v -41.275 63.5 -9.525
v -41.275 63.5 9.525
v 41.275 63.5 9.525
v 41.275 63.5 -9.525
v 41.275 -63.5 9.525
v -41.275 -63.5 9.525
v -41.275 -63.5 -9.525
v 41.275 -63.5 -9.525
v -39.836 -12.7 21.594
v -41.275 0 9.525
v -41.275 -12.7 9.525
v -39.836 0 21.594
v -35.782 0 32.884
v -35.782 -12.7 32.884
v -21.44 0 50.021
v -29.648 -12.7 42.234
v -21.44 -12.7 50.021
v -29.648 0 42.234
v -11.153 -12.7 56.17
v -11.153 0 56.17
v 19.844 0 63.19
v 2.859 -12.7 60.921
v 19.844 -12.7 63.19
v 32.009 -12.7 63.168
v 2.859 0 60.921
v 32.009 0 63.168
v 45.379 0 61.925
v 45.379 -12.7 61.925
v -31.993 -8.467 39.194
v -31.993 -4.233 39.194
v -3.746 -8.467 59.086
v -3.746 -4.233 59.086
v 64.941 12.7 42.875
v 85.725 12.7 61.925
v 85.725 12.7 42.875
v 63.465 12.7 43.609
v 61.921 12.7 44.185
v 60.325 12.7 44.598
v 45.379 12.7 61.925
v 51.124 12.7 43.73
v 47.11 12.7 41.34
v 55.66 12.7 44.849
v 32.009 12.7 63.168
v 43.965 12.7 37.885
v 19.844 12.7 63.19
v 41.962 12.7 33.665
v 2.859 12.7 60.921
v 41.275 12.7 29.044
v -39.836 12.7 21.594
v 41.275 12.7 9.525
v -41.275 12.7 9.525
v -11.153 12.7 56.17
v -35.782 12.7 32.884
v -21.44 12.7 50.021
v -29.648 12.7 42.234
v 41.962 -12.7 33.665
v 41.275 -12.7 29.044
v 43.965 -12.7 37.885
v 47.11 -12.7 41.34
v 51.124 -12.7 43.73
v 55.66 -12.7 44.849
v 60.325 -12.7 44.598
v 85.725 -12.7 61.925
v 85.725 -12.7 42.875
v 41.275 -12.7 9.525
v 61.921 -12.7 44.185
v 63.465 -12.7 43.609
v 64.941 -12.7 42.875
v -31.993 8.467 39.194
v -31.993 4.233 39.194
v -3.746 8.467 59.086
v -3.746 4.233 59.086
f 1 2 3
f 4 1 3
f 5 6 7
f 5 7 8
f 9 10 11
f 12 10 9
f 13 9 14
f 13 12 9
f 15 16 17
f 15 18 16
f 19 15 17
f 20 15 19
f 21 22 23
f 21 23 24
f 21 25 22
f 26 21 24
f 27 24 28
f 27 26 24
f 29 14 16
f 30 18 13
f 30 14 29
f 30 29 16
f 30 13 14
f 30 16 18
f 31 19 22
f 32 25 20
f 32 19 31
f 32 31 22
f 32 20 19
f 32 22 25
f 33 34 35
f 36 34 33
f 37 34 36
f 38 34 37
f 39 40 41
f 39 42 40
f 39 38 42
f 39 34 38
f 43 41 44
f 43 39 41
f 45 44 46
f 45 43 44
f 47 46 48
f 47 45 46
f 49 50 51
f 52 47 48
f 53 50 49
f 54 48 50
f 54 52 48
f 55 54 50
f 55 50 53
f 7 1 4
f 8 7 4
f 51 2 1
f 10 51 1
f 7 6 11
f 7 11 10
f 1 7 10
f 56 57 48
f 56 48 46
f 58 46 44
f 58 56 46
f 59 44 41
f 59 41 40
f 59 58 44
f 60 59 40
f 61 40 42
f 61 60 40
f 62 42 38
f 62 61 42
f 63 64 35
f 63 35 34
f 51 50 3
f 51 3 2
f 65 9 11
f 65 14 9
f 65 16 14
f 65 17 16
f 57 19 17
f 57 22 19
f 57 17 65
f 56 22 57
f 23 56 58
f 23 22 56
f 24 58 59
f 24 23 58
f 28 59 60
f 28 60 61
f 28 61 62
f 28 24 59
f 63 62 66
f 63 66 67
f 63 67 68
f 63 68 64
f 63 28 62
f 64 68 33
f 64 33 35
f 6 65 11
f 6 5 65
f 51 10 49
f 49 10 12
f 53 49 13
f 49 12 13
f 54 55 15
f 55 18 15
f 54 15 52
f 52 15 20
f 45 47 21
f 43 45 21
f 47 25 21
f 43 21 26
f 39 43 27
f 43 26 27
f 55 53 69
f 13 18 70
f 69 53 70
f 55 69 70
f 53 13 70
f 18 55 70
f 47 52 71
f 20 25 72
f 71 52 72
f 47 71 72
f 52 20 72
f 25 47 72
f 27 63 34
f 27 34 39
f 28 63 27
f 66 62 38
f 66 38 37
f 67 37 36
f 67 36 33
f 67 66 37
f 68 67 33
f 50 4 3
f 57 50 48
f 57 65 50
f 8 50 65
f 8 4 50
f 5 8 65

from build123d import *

# Parameters (mm, degrees)
F1_DEPTH = 63.5
F2_DEPTH = 12.7
F3_DEPTH = 12.7


with BuildPart() as f1:
    # F0 (on Front) → F1 (new body, symmetric)
    with BuildSketch(Plane.XZ):
        Polygon((-41.275, 9.525), (-41.275, -9.525), (41.275, -9.525), (41.275, 9.525), (22.225, 9.525), align=None)
    extrude(amount=F1_DEPTH, both=True)

    # F0 (on Front) → F2 (join, symmetric)
    with BuildSketch(Plane.XZ):
        with BuildLine():
            Line((22.225, 9.525), (41.275, 9.525))
            Line((41.275, 9.525), (41.275, 29.043647))
            ThreePointArc((41.275, 29.043647), (47.109768, 41.340369), (60.325, 44.597907))
            Line((60.325, 44.597907), (60.325, 61.9252))
            Line((60.325, 61.9252), (45.378887, 61.9252))
            ThreePointArc((45.378887, 61.9252), (28.59425, 49.151475), (22.225, 29.043647))
            Line((22.225, 29.043647), (22.225, 9.525))
        make_face()
        with BuildLine():
            Line((85.725, 61.9252), (60.325, 61.9252))
            Line((60.325, 61.9252), (60.325, 44.597907))
            ThreePointArc((60.325, 44.597907), (62.700375, 43.916743), (64.941262, 42.8752))
            Line((64.941262, 42.8752), (85.725, 42.8752))
            Line((85.725, 42.8752), (85.725, 61.9252))
        make_face()
    extrude(amount=F2_DEPTH, both=True)

    # F0 (on Front) → F3 (join, symmetric)
    with BuildSketch(Plane.XZ):
        with BuildLine():
            add(Edge.make_bspline(
                [(-41.275, 9.525), (-40.837802, 41.657459), (-14.82299, 70.037253), (45.378887, 61.9252)],
                knots=[0, 0, 0, 0, 101.265379, 101.265379, 101.265379, 101.265379], degree=3))
            Line((-41.275, 9.525), (22.225, 9.525))
            Line((22.225, 9.525), (22.225, 29.043647))
            ThreePointArc((22.225, 29.043647), (28.59425, 49.151475), (45.378887, 61.9252))
        make_face()
    extrude(amount=F3_DEPTH, both=True)


solid = f1.part
